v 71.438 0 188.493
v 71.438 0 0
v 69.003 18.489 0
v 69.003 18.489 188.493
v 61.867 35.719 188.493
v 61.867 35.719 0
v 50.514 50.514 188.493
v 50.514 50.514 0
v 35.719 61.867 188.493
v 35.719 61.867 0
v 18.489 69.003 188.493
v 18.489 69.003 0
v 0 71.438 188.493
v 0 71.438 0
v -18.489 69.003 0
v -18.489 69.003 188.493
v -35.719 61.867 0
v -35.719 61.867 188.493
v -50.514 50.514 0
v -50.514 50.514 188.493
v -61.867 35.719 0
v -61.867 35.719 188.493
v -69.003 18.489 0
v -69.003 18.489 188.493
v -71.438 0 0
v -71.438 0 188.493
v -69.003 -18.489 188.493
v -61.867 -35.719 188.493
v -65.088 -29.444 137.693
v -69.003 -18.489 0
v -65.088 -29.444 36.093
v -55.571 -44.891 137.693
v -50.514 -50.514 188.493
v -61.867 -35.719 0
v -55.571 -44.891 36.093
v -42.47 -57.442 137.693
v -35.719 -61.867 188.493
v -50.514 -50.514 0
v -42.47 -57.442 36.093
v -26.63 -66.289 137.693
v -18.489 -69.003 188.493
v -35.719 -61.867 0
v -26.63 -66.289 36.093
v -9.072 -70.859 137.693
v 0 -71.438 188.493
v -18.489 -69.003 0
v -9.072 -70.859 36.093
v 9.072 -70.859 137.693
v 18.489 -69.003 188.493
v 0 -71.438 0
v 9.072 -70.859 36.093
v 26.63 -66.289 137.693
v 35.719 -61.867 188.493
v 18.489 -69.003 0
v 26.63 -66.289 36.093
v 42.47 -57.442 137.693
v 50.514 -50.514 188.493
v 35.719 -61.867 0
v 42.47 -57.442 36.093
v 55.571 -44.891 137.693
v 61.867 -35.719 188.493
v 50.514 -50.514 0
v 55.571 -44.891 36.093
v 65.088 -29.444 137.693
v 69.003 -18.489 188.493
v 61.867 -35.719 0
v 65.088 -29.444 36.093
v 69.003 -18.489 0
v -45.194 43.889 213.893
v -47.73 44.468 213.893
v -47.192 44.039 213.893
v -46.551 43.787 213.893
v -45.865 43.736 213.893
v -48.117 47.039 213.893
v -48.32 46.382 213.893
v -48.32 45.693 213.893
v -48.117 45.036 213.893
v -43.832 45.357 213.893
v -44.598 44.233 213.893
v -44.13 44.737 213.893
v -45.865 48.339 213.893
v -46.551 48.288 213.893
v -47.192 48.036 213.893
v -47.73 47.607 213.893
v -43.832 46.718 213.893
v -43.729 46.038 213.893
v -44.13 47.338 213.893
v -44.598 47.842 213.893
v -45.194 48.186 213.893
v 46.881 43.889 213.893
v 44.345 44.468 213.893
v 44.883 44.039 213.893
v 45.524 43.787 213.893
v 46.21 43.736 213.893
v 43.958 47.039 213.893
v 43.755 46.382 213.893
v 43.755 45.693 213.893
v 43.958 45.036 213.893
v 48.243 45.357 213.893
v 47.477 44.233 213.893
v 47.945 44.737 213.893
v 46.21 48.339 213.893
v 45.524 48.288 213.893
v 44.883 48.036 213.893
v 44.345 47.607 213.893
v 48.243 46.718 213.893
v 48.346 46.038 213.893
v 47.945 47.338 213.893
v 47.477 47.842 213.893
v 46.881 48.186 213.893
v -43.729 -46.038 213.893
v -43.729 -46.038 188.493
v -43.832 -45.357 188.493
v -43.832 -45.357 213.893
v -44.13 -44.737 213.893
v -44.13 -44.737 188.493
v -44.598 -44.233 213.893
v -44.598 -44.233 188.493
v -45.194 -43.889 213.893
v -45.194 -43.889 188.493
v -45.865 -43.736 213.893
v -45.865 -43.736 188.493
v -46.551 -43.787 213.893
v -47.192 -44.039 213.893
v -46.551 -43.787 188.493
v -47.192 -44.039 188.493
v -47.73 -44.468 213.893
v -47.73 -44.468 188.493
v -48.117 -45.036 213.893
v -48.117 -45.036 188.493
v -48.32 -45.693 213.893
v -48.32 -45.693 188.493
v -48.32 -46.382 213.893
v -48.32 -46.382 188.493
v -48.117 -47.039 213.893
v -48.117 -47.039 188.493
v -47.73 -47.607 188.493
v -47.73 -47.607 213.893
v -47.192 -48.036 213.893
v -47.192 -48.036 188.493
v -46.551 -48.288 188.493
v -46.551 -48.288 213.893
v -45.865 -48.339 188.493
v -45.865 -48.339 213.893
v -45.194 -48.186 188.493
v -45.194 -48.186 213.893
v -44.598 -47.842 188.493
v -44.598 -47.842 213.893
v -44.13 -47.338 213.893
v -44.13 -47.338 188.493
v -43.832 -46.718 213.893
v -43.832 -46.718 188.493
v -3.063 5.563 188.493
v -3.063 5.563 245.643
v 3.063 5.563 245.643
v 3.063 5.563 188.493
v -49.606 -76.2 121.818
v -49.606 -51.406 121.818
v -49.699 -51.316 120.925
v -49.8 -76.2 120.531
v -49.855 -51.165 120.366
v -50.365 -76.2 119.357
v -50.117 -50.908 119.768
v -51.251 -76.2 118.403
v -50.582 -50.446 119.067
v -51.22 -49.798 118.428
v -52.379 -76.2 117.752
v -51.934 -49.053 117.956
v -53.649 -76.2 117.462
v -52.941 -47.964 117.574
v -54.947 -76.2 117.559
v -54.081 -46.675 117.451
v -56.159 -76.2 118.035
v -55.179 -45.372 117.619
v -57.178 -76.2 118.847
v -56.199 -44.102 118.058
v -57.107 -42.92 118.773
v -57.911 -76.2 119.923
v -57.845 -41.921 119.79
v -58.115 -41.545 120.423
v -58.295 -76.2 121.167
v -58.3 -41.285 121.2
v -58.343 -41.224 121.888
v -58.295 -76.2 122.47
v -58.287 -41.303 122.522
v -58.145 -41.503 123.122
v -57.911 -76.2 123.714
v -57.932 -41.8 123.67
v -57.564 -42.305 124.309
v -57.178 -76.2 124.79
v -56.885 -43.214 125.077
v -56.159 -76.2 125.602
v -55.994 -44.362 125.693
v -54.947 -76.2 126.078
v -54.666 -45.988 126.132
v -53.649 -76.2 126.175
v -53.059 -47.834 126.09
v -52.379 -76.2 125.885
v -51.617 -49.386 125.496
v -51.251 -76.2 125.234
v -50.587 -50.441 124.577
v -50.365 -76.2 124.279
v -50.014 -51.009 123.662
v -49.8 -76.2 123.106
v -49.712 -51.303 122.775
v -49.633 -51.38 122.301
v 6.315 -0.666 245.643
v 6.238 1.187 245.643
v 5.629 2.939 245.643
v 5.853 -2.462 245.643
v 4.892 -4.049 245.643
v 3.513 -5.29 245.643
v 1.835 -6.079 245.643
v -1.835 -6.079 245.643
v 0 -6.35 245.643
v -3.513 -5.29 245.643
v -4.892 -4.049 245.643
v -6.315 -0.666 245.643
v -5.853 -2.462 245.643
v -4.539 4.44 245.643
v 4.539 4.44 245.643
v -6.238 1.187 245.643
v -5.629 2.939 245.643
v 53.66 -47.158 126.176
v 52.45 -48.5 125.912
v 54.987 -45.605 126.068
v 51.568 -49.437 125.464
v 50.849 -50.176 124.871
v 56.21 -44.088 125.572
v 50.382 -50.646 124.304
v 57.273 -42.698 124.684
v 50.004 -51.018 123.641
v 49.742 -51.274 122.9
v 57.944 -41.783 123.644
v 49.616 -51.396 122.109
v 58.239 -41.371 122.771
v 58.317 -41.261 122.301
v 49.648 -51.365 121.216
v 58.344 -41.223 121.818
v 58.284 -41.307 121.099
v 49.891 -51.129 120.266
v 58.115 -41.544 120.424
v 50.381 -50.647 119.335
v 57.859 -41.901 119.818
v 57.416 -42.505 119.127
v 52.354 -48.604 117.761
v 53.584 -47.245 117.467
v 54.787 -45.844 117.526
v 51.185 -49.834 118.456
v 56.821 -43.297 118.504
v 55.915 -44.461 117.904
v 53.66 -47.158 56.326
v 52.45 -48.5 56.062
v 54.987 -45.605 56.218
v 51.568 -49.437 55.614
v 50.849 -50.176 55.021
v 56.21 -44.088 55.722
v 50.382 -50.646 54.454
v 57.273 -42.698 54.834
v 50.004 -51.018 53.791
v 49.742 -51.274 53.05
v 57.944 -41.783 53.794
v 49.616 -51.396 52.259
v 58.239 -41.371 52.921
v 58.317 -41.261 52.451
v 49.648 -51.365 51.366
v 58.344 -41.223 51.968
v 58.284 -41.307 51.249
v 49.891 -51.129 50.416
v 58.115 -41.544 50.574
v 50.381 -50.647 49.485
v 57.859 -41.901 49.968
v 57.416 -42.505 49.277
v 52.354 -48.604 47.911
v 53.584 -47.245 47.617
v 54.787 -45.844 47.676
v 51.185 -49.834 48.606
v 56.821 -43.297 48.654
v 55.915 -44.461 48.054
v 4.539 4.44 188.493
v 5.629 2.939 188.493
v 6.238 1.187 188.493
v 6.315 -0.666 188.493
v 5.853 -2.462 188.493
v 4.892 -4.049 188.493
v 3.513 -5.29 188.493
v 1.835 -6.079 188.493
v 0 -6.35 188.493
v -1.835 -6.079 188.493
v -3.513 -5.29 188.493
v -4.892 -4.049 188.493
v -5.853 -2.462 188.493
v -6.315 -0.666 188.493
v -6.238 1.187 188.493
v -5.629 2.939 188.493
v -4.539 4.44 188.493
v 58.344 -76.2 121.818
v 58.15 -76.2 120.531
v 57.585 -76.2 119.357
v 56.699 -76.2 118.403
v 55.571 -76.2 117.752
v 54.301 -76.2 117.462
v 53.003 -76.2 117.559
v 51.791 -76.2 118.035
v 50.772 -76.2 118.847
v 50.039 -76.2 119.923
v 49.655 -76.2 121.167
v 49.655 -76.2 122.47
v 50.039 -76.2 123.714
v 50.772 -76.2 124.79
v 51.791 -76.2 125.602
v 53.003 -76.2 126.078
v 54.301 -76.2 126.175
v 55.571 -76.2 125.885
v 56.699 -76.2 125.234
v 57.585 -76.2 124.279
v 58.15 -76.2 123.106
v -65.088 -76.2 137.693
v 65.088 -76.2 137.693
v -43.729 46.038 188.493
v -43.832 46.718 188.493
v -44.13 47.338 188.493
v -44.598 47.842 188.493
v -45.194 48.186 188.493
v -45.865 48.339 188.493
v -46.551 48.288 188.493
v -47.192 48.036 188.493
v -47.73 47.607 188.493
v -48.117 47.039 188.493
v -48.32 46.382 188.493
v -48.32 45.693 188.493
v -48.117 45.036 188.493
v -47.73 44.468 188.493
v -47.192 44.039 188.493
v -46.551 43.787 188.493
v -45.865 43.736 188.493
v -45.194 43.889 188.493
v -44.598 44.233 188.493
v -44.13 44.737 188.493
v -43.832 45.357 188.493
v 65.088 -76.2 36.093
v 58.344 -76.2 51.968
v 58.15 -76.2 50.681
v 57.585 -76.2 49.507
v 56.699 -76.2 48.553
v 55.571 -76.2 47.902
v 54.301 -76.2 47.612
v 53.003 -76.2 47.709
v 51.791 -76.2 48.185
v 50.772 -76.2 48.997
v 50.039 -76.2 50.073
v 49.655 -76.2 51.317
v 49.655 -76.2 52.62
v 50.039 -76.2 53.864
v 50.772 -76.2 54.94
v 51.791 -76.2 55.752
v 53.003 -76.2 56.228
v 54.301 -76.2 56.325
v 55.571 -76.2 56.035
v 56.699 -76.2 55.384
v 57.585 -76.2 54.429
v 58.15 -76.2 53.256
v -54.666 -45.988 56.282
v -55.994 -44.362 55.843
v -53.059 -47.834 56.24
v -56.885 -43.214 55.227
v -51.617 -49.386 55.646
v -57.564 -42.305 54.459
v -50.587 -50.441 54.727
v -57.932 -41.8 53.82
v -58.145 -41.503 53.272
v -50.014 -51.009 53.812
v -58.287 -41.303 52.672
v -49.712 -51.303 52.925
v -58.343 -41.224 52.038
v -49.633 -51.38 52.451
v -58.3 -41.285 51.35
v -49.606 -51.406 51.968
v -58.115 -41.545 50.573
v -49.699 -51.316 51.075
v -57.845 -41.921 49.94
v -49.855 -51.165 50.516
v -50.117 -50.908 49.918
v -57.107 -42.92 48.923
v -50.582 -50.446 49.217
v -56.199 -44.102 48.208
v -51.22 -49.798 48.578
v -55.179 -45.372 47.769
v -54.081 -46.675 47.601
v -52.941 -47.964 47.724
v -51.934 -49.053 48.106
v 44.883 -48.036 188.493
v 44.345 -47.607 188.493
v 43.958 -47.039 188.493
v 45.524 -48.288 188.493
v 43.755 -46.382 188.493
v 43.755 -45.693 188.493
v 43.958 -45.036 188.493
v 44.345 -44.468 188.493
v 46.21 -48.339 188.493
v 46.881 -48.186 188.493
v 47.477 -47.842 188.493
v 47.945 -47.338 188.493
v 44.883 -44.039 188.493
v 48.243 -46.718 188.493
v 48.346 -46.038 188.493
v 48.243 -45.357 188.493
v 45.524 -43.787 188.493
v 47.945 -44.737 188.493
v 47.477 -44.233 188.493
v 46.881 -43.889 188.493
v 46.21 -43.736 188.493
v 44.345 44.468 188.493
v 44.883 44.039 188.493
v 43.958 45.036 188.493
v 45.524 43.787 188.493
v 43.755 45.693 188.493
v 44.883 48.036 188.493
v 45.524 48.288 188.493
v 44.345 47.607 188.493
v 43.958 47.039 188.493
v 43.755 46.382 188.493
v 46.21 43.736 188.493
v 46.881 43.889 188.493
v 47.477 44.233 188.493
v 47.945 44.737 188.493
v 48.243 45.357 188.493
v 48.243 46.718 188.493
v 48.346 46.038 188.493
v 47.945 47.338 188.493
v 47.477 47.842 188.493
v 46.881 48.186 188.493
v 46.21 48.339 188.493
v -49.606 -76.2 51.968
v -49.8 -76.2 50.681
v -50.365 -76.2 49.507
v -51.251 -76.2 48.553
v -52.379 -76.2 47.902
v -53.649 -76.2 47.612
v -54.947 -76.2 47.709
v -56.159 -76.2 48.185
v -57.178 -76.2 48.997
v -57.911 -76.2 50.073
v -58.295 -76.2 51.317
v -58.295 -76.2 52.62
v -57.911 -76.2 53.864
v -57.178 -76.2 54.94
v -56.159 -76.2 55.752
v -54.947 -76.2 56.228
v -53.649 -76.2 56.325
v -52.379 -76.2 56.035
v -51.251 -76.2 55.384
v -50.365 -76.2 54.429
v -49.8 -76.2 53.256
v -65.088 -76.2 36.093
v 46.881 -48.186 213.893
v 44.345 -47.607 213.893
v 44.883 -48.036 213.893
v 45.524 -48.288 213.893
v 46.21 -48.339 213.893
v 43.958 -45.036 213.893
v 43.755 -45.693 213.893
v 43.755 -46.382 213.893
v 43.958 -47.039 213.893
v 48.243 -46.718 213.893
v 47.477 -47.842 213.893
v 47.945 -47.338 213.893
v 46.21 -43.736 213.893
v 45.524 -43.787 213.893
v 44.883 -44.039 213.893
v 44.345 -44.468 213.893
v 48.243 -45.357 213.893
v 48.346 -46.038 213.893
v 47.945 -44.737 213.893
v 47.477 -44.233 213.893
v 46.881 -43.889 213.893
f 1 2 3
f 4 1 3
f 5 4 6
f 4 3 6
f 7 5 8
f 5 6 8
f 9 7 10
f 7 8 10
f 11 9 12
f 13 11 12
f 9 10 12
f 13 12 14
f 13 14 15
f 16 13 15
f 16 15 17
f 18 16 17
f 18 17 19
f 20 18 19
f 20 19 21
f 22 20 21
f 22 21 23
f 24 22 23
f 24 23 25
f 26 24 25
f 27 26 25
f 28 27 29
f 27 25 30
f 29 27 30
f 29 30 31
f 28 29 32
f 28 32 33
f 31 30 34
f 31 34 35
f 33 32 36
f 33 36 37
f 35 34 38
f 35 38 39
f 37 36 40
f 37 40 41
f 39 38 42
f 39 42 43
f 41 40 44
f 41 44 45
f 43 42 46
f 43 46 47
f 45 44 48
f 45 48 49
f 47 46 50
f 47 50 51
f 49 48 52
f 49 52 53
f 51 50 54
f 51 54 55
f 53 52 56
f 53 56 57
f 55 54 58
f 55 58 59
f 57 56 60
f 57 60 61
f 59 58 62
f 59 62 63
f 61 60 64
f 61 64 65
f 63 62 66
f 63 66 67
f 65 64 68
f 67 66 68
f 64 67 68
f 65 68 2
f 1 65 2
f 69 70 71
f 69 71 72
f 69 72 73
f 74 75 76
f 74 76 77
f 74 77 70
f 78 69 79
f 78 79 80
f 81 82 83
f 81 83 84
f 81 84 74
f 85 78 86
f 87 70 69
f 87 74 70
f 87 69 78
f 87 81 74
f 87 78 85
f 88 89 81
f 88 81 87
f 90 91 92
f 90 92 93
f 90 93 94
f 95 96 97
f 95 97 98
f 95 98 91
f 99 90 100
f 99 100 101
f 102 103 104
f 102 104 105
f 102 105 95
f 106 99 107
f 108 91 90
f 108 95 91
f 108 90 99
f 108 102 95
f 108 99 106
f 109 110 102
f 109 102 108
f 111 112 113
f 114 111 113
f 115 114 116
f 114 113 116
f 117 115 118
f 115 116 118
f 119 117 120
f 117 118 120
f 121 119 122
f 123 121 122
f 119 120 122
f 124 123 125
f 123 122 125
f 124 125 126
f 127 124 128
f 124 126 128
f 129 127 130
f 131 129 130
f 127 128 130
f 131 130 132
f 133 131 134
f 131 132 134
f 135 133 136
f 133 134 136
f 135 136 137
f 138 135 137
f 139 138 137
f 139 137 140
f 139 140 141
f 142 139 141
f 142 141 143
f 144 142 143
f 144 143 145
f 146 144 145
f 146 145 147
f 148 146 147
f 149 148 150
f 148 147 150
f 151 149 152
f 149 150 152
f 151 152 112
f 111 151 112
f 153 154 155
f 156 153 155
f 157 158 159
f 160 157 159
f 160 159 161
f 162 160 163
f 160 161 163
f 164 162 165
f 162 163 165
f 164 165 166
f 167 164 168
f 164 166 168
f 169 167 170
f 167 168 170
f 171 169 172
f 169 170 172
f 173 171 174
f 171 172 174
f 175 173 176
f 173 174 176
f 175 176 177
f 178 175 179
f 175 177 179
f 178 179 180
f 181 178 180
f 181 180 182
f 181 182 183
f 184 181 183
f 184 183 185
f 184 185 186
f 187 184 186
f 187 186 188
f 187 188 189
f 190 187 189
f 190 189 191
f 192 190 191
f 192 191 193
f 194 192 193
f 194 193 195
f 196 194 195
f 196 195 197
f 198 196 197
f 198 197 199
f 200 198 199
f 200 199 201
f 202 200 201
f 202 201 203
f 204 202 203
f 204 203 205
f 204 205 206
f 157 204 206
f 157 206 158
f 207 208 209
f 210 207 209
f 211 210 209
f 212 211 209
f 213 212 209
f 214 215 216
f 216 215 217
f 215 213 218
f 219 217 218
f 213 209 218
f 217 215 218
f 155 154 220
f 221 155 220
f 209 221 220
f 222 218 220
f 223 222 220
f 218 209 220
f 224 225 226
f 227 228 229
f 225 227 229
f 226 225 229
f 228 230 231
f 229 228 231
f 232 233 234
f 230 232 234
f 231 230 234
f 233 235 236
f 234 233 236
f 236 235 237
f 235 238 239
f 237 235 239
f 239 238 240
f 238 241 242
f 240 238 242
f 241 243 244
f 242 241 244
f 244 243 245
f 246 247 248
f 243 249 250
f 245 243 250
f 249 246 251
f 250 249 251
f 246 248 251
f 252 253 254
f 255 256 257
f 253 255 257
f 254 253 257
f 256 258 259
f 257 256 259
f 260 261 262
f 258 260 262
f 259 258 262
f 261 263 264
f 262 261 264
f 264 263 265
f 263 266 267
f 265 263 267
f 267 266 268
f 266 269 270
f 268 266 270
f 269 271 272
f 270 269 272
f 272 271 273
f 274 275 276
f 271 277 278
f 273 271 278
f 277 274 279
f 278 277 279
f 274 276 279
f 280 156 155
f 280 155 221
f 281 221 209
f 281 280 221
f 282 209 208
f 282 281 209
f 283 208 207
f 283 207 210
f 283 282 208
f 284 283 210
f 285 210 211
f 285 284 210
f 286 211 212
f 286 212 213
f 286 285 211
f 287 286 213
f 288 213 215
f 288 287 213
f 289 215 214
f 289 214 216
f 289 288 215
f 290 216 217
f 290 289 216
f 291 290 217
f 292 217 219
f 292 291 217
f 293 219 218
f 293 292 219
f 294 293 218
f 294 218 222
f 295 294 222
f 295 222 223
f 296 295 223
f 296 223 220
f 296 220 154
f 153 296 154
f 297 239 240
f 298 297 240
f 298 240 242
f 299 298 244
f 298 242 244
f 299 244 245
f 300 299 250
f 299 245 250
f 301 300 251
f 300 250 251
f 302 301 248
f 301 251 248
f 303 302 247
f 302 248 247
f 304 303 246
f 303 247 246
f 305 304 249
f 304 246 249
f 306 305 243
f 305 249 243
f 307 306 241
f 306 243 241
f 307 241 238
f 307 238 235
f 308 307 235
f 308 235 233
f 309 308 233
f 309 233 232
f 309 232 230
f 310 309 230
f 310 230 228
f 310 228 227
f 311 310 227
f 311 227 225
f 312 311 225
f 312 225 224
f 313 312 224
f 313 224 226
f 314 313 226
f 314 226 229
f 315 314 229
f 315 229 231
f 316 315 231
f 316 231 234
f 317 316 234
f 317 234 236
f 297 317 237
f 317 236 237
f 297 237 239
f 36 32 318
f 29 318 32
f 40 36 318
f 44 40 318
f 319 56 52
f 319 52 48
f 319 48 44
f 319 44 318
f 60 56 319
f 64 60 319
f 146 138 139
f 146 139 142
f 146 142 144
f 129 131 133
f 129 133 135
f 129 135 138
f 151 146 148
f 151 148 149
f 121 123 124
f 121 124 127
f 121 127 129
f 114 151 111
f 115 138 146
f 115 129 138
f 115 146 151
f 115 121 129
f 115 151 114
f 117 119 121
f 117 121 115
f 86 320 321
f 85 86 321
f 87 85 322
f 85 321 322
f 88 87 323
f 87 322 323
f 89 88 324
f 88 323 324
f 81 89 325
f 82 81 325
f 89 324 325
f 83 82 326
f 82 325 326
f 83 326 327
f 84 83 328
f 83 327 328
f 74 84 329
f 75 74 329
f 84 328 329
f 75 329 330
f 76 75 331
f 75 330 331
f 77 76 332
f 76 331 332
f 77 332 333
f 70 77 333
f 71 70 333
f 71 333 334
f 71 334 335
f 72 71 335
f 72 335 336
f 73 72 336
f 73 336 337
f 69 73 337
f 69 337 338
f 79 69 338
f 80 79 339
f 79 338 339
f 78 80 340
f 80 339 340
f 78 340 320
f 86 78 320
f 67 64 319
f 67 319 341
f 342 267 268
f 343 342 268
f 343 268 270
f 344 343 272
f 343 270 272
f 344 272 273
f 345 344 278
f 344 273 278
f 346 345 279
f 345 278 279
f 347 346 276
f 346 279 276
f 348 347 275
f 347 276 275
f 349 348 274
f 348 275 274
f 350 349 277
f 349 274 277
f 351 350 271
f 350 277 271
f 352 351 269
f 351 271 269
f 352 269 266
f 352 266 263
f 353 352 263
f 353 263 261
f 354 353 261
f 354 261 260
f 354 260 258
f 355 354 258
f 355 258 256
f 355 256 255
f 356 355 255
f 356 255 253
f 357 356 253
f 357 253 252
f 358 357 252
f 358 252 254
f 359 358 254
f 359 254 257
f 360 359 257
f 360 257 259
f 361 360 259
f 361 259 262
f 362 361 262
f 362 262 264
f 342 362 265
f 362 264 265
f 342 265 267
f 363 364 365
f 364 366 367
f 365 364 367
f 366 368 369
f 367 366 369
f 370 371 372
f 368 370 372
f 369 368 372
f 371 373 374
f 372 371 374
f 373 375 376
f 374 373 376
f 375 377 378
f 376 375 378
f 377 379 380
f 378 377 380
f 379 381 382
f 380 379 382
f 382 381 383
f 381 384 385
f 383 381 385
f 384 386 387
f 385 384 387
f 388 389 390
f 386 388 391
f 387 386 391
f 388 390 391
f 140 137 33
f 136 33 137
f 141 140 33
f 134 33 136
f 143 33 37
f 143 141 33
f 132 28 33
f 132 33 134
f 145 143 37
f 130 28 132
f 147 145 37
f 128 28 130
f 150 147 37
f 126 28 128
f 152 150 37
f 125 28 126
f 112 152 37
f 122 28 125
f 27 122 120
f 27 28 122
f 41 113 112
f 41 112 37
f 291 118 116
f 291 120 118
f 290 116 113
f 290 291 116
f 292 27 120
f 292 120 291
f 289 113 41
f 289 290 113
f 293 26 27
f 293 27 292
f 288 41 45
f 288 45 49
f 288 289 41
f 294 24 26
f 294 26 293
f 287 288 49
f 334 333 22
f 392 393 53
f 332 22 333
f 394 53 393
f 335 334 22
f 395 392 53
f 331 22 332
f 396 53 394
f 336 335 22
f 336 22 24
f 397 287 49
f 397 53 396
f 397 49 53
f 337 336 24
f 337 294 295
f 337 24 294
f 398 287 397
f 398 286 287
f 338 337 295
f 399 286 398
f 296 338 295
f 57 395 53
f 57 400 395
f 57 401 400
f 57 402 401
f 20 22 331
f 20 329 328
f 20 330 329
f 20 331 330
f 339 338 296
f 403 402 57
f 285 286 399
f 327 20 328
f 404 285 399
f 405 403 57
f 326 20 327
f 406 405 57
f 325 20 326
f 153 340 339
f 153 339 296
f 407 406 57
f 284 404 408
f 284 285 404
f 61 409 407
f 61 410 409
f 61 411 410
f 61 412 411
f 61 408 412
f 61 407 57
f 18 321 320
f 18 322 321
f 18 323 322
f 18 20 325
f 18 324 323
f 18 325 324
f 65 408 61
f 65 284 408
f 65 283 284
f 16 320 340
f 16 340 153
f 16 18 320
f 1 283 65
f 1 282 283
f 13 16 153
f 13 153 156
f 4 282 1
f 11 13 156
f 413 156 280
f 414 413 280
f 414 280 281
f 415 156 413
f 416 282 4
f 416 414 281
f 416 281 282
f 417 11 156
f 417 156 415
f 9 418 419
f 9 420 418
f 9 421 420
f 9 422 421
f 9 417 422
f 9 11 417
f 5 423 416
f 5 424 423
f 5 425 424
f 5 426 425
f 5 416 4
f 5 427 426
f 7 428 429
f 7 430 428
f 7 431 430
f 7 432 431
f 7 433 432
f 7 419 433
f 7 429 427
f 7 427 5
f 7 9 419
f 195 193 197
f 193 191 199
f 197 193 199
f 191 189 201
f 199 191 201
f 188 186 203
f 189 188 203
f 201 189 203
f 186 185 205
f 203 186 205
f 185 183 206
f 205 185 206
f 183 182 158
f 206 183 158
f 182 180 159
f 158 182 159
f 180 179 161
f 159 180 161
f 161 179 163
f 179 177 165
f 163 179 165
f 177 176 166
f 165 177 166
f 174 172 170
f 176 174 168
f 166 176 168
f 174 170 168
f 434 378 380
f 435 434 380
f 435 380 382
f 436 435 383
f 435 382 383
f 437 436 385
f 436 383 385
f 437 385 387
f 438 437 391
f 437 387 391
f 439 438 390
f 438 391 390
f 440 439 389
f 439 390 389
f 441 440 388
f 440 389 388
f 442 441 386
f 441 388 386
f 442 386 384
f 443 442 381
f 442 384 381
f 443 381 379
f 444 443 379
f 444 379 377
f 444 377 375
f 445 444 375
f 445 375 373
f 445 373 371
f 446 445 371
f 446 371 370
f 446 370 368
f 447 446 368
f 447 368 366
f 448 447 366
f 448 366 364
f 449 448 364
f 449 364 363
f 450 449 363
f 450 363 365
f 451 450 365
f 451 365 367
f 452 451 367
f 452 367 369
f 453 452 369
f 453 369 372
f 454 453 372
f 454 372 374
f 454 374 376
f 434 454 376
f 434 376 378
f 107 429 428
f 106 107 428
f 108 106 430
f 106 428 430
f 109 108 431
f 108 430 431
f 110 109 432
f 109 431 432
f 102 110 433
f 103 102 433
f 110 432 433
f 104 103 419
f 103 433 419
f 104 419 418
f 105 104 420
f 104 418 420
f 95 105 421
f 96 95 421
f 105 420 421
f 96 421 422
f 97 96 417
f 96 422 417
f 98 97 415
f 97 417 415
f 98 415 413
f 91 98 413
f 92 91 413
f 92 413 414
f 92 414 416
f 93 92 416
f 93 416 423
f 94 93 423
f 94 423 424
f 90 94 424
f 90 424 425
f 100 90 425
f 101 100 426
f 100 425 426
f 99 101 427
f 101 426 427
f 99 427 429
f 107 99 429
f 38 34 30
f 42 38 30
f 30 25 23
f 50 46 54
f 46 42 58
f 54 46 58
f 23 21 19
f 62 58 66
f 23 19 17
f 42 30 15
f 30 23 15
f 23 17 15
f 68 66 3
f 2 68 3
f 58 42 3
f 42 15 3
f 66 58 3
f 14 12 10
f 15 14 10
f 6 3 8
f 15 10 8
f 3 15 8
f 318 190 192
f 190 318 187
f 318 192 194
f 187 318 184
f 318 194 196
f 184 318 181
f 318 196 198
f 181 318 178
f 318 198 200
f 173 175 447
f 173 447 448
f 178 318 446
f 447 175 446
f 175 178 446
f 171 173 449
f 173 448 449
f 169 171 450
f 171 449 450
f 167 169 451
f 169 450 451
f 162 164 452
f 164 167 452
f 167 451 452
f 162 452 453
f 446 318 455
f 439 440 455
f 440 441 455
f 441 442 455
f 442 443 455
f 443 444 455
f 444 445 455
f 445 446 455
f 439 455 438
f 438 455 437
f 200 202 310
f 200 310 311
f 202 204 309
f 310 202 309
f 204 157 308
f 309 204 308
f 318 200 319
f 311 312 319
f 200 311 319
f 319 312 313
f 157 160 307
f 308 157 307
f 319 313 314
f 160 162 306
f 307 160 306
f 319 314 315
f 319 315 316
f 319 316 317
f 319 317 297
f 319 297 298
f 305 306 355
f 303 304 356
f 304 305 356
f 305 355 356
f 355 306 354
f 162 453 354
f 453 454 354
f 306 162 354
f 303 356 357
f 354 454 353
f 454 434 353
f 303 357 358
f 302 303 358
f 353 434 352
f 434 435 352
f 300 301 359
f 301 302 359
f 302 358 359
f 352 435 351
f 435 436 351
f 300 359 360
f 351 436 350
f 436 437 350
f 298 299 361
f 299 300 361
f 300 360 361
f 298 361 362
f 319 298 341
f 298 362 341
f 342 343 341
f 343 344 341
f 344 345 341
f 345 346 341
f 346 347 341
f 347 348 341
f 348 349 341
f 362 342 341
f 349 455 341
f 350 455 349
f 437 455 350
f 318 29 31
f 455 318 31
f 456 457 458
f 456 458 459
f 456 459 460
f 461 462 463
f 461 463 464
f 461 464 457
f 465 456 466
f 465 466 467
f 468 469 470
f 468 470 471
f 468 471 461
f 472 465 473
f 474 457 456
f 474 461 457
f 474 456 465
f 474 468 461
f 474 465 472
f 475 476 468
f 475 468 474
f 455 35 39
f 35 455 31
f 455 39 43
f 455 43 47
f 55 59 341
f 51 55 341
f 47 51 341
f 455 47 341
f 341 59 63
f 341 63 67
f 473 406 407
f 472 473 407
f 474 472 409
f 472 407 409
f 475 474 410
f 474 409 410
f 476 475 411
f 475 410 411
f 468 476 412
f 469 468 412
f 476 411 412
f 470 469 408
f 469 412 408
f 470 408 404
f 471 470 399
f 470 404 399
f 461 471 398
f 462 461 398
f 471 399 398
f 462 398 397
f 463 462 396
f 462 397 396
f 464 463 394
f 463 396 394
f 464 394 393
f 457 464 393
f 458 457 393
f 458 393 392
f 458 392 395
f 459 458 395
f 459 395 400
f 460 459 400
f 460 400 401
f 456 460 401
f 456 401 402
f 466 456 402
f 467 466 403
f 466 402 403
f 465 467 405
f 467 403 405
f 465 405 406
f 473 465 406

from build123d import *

# Parameters (mm, degrees)
SKETCH1_R           = 71.4375
BOSS_EXTRUDE1_DEPTH = 188.4934
SKETCH2_R           = 2.308225
BOSS_EXTRUDE2_DEPTH = 25.4
BOSS_EXTRUDE3_DEPTH = 57.15
SKETCH4_W           = 130.175
SKETCH4_H           = 101.6
SKETCH4_R           = 4.3688
BOSS_EXTRUDE4_DEPTH = 76.2


with BuildPart() as part:
    # Sketch1 → Boss-Extrude1 (new body)
    with BuildSketch(Plane.XY):
        Circle(SKETCH1_R)
    extrude(amount=BOSS_EXTRUDE1_DEPTH)

    # Sketch2 → Boss-Extrude2 (add)
    with BuildSketch(Plane.XY.offset(188.4934)):
        with Locations((-46.0375, 46.0375)):
            Circle(SKETCH2_R)
        with Locations((-46.0375, -46.0375)):
            Circle(SKETCH2_R)
        with Locations((46.0375, -46.0375)):
            Circle(SKETCH2_R)
        with Locations((46.0375, 46.0375)):
            Circle(SKETCH2_R)
    extrude(amount=BOSS_EXTRUDE2_DEPTH)

    # Sketch3 → Boss-Extrude3 (add)
    with BuildSketch(Plane.XY.offset(188.4934)):
        with BuildLine():
            Line((-3.062675504, 5.5626), (3.062675504, 5.5626))
            ThreePointArc((3.062675504, 5.5626), (0, -6.35), (-3.062675504, 5.5626))
        make_face()
    extrude(amount=BOSS_EXTRUDE3_DEPTH)

    # Sketch4 → Boss-Extrude4 (add)
    with BuildSketch(Plane(origin=(0, 0, 0), x_dir=(1, 0, 0), z_dir=(0, 1, 0))):
        with Locations((0, -86.8934)):
            Rectangle(SKETCH4_W, SKETCH4_H)
        with Locations((-53.975, -121.8184)):
            Circle(SKETCH4_R, mode=Mode.SUBTRACT)
        with Locations((53.975, -121.8184)):
            Circle(SKETCH4_R, mode=Mode.SUBTRACT)
        with Locations((-53.975, -51.9684)):
            Circle(SKETCH4_R, mode=Mode.SUBTRACT)
        with Locations((53.975, -51.9684)):
            Circle(SKETCH4_R, mode=Mode.SUBTRACT)
    extrude(amount=-BOSS_EXTRUDE4_DEPTH)


solid = part.part
